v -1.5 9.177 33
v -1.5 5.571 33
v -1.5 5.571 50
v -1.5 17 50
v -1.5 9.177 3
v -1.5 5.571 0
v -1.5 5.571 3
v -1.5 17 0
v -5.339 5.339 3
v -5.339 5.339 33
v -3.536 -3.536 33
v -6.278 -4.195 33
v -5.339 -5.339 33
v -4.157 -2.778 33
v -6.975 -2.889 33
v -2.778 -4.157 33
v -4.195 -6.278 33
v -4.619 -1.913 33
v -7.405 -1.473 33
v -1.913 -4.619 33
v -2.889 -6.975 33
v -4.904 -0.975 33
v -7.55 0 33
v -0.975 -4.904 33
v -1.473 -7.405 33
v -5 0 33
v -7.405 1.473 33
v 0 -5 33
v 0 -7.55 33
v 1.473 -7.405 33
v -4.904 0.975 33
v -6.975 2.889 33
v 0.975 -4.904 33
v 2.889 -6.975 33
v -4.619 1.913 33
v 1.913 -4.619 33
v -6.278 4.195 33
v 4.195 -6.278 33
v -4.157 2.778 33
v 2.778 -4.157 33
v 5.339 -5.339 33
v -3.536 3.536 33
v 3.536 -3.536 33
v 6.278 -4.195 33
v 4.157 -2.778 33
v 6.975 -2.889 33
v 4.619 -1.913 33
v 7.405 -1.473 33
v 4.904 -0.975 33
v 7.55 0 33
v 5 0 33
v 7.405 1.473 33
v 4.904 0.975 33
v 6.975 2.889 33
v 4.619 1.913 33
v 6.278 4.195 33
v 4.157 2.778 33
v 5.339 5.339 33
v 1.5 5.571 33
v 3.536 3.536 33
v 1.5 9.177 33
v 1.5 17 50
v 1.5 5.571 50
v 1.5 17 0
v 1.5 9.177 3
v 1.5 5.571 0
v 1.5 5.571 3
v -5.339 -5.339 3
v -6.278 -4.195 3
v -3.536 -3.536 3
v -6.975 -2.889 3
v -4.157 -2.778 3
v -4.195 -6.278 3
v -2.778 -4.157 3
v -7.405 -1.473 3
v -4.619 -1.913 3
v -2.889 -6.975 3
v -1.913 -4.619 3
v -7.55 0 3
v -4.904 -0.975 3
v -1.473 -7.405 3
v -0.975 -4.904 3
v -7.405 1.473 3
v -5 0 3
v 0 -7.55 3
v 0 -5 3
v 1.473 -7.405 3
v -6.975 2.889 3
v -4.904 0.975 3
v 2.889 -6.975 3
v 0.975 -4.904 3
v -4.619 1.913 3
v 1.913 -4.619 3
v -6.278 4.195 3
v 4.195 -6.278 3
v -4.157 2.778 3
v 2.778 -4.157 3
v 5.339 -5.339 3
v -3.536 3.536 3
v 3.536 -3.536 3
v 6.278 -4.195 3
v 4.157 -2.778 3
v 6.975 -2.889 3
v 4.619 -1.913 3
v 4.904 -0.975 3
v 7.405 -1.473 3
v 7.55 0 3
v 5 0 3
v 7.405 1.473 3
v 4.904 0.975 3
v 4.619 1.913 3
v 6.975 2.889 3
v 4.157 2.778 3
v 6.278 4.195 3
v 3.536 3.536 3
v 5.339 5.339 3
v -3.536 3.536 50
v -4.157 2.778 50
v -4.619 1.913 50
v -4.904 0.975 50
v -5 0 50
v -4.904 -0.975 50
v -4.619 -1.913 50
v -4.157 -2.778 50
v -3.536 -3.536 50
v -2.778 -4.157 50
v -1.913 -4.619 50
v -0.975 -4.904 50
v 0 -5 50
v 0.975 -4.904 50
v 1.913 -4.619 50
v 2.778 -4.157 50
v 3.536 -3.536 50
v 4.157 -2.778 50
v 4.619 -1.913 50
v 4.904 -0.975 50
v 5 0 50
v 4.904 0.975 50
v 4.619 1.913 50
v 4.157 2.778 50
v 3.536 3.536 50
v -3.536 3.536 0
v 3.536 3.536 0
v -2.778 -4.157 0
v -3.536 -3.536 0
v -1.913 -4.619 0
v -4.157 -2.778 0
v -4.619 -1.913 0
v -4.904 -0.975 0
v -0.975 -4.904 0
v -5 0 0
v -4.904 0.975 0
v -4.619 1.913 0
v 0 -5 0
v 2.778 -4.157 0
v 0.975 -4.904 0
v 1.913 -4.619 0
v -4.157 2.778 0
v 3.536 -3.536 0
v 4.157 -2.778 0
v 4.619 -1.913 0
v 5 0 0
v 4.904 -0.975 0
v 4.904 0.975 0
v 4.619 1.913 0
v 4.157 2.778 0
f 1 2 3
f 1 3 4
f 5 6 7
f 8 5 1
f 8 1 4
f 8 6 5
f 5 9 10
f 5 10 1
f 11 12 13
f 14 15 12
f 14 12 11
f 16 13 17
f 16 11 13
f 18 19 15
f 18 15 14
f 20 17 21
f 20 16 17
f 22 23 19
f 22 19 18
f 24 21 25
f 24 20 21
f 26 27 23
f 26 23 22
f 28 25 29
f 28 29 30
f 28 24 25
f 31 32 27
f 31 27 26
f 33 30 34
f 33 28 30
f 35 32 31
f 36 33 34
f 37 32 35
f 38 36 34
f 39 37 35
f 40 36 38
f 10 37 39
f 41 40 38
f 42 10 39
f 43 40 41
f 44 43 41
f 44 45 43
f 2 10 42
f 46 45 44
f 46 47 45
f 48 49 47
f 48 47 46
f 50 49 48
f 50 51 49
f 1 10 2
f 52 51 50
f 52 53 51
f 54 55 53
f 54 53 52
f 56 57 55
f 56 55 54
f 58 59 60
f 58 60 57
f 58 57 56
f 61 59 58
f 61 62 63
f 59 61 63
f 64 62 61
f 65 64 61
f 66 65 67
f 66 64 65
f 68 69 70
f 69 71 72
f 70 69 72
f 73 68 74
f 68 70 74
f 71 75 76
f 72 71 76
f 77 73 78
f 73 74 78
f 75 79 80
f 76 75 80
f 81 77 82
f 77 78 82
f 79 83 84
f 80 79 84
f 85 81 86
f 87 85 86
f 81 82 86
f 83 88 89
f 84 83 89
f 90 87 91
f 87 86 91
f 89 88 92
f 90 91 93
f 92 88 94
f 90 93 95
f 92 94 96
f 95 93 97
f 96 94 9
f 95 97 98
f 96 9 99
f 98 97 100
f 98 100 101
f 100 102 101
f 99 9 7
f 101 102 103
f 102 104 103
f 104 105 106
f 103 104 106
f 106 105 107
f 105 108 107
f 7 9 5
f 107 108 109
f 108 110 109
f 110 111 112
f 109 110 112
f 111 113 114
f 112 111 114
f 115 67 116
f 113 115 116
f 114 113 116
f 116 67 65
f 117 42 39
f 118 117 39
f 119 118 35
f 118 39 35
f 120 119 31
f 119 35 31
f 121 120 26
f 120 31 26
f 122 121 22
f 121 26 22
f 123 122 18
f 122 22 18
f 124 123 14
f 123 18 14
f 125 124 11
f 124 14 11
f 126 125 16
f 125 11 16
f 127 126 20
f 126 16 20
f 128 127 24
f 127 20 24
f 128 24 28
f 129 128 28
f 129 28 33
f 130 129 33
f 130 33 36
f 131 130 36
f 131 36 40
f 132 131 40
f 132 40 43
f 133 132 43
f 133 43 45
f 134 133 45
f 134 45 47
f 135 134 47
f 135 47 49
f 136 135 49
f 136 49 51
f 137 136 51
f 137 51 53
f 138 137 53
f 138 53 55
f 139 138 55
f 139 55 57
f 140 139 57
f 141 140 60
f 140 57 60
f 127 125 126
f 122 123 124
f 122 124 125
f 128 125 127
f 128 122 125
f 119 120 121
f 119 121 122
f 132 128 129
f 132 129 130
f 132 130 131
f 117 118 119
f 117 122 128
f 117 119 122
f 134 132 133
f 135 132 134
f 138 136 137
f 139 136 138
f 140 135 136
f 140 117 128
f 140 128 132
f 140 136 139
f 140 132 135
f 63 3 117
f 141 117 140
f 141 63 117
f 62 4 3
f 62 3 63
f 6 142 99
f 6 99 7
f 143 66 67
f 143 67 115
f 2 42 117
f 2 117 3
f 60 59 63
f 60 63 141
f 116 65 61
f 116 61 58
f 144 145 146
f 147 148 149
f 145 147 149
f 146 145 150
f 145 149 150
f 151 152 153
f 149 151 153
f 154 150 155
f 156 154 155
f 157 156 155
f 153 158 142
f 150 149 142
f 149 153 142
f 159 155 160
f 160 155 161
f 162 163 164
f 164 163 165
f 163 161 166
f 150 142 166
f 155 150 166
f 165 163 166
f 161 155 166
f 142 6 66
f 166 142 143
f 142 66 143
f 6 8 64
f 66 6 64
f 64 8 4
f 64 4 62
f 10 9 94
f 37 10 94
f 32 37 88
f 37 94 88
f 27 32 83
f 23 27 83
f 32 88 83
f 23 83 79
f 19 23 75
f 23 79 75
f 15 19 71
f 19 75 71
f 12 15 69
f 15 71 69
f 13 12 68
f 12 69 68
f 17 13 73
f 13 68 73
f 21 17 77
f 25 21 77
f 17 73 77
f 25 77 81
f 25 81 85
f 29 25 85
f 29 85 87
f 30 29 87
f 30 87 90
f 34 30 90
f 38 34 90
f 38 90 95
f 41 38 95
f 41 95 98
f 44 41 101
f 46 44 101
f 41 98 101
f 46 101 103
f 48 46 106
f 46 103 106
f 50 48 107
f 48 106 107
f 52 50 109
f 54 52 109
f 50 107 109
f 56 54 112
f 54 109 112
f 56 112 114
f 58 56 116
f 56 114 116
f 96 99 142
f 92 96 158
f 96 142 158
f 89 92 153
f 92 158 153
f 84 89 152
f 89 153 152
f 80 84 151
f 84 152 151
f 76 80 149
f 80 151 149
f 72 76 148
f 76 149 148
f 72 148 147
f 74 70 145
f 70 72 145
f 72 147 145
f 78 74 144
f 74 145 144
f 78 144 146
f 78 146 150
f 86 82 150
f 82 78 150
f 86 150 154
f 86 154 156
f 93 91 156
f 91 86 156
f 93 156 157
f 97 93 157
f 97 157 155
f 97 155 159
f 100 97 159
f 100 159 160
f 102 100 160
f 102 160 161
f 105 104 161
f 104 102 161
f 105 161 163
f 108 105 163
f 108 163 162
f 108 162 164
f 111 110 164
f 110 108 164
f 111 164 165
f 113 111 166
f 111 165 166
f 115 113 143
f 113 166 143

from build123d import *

# Parameters (mm, degrees)
EXTRUDE004_DEPTH = 30
PAD008_DEPTH     = 50


with BuildPart() as bearingslot001:
    # Sketch025 → Extrude004 (new body)
    with BuildSketch(Plane.XY):
        with BuildLine():
            ThreePointArc((-5.33868, 5.338632), (0, -7.55), (5.33868, 5.338632))
            Line((1.5, 9.177312), (5.33868, 5.338632))
            Line((1.5, 17), (1.5, 9.177312))
            Line((-1.5, 17), (1.5, 17))
            Line((-1.5, 9.177312), (-1.5, 17))
            Line((-5.33868, 5.338632), (-1.5, 9.177312))
        make_face()
    extrude(amount=EXTRUDE004_DEPTH)


with BuildPart() as bearingslot001_1:
    # Extrude004 placement: moved
    add(bearingslot001.part.moved(Location((0, 0, 3))))


with BuildPart() as yaxiscavity:
    # Sketch024 → Pad008 (new body)
    with BuildSketch(Plane.XY):
        with BuildLine():
            ThreePointArc((-3.535534, 3.535534), (0, -5), (3.535534, 3.535534))
            Line((1.5, 5.571068), (3.535534, 3.535534))
            Line((1.5, 17), (1.5, 5.571068))
            Line((-1.5, 17), (1.5, 17))
            Line((-1.5, 5.571068), (-1.5, 17))
            Line((-3.535534, 3.535534), (-1.5, 5.571068))
        make_face()
    extrude(amount=PAD008_DEPTH)

    # Fusion002: union BearingSlot001
    add(bearingslot001_1.part)


solid = yaxiscavity.part
